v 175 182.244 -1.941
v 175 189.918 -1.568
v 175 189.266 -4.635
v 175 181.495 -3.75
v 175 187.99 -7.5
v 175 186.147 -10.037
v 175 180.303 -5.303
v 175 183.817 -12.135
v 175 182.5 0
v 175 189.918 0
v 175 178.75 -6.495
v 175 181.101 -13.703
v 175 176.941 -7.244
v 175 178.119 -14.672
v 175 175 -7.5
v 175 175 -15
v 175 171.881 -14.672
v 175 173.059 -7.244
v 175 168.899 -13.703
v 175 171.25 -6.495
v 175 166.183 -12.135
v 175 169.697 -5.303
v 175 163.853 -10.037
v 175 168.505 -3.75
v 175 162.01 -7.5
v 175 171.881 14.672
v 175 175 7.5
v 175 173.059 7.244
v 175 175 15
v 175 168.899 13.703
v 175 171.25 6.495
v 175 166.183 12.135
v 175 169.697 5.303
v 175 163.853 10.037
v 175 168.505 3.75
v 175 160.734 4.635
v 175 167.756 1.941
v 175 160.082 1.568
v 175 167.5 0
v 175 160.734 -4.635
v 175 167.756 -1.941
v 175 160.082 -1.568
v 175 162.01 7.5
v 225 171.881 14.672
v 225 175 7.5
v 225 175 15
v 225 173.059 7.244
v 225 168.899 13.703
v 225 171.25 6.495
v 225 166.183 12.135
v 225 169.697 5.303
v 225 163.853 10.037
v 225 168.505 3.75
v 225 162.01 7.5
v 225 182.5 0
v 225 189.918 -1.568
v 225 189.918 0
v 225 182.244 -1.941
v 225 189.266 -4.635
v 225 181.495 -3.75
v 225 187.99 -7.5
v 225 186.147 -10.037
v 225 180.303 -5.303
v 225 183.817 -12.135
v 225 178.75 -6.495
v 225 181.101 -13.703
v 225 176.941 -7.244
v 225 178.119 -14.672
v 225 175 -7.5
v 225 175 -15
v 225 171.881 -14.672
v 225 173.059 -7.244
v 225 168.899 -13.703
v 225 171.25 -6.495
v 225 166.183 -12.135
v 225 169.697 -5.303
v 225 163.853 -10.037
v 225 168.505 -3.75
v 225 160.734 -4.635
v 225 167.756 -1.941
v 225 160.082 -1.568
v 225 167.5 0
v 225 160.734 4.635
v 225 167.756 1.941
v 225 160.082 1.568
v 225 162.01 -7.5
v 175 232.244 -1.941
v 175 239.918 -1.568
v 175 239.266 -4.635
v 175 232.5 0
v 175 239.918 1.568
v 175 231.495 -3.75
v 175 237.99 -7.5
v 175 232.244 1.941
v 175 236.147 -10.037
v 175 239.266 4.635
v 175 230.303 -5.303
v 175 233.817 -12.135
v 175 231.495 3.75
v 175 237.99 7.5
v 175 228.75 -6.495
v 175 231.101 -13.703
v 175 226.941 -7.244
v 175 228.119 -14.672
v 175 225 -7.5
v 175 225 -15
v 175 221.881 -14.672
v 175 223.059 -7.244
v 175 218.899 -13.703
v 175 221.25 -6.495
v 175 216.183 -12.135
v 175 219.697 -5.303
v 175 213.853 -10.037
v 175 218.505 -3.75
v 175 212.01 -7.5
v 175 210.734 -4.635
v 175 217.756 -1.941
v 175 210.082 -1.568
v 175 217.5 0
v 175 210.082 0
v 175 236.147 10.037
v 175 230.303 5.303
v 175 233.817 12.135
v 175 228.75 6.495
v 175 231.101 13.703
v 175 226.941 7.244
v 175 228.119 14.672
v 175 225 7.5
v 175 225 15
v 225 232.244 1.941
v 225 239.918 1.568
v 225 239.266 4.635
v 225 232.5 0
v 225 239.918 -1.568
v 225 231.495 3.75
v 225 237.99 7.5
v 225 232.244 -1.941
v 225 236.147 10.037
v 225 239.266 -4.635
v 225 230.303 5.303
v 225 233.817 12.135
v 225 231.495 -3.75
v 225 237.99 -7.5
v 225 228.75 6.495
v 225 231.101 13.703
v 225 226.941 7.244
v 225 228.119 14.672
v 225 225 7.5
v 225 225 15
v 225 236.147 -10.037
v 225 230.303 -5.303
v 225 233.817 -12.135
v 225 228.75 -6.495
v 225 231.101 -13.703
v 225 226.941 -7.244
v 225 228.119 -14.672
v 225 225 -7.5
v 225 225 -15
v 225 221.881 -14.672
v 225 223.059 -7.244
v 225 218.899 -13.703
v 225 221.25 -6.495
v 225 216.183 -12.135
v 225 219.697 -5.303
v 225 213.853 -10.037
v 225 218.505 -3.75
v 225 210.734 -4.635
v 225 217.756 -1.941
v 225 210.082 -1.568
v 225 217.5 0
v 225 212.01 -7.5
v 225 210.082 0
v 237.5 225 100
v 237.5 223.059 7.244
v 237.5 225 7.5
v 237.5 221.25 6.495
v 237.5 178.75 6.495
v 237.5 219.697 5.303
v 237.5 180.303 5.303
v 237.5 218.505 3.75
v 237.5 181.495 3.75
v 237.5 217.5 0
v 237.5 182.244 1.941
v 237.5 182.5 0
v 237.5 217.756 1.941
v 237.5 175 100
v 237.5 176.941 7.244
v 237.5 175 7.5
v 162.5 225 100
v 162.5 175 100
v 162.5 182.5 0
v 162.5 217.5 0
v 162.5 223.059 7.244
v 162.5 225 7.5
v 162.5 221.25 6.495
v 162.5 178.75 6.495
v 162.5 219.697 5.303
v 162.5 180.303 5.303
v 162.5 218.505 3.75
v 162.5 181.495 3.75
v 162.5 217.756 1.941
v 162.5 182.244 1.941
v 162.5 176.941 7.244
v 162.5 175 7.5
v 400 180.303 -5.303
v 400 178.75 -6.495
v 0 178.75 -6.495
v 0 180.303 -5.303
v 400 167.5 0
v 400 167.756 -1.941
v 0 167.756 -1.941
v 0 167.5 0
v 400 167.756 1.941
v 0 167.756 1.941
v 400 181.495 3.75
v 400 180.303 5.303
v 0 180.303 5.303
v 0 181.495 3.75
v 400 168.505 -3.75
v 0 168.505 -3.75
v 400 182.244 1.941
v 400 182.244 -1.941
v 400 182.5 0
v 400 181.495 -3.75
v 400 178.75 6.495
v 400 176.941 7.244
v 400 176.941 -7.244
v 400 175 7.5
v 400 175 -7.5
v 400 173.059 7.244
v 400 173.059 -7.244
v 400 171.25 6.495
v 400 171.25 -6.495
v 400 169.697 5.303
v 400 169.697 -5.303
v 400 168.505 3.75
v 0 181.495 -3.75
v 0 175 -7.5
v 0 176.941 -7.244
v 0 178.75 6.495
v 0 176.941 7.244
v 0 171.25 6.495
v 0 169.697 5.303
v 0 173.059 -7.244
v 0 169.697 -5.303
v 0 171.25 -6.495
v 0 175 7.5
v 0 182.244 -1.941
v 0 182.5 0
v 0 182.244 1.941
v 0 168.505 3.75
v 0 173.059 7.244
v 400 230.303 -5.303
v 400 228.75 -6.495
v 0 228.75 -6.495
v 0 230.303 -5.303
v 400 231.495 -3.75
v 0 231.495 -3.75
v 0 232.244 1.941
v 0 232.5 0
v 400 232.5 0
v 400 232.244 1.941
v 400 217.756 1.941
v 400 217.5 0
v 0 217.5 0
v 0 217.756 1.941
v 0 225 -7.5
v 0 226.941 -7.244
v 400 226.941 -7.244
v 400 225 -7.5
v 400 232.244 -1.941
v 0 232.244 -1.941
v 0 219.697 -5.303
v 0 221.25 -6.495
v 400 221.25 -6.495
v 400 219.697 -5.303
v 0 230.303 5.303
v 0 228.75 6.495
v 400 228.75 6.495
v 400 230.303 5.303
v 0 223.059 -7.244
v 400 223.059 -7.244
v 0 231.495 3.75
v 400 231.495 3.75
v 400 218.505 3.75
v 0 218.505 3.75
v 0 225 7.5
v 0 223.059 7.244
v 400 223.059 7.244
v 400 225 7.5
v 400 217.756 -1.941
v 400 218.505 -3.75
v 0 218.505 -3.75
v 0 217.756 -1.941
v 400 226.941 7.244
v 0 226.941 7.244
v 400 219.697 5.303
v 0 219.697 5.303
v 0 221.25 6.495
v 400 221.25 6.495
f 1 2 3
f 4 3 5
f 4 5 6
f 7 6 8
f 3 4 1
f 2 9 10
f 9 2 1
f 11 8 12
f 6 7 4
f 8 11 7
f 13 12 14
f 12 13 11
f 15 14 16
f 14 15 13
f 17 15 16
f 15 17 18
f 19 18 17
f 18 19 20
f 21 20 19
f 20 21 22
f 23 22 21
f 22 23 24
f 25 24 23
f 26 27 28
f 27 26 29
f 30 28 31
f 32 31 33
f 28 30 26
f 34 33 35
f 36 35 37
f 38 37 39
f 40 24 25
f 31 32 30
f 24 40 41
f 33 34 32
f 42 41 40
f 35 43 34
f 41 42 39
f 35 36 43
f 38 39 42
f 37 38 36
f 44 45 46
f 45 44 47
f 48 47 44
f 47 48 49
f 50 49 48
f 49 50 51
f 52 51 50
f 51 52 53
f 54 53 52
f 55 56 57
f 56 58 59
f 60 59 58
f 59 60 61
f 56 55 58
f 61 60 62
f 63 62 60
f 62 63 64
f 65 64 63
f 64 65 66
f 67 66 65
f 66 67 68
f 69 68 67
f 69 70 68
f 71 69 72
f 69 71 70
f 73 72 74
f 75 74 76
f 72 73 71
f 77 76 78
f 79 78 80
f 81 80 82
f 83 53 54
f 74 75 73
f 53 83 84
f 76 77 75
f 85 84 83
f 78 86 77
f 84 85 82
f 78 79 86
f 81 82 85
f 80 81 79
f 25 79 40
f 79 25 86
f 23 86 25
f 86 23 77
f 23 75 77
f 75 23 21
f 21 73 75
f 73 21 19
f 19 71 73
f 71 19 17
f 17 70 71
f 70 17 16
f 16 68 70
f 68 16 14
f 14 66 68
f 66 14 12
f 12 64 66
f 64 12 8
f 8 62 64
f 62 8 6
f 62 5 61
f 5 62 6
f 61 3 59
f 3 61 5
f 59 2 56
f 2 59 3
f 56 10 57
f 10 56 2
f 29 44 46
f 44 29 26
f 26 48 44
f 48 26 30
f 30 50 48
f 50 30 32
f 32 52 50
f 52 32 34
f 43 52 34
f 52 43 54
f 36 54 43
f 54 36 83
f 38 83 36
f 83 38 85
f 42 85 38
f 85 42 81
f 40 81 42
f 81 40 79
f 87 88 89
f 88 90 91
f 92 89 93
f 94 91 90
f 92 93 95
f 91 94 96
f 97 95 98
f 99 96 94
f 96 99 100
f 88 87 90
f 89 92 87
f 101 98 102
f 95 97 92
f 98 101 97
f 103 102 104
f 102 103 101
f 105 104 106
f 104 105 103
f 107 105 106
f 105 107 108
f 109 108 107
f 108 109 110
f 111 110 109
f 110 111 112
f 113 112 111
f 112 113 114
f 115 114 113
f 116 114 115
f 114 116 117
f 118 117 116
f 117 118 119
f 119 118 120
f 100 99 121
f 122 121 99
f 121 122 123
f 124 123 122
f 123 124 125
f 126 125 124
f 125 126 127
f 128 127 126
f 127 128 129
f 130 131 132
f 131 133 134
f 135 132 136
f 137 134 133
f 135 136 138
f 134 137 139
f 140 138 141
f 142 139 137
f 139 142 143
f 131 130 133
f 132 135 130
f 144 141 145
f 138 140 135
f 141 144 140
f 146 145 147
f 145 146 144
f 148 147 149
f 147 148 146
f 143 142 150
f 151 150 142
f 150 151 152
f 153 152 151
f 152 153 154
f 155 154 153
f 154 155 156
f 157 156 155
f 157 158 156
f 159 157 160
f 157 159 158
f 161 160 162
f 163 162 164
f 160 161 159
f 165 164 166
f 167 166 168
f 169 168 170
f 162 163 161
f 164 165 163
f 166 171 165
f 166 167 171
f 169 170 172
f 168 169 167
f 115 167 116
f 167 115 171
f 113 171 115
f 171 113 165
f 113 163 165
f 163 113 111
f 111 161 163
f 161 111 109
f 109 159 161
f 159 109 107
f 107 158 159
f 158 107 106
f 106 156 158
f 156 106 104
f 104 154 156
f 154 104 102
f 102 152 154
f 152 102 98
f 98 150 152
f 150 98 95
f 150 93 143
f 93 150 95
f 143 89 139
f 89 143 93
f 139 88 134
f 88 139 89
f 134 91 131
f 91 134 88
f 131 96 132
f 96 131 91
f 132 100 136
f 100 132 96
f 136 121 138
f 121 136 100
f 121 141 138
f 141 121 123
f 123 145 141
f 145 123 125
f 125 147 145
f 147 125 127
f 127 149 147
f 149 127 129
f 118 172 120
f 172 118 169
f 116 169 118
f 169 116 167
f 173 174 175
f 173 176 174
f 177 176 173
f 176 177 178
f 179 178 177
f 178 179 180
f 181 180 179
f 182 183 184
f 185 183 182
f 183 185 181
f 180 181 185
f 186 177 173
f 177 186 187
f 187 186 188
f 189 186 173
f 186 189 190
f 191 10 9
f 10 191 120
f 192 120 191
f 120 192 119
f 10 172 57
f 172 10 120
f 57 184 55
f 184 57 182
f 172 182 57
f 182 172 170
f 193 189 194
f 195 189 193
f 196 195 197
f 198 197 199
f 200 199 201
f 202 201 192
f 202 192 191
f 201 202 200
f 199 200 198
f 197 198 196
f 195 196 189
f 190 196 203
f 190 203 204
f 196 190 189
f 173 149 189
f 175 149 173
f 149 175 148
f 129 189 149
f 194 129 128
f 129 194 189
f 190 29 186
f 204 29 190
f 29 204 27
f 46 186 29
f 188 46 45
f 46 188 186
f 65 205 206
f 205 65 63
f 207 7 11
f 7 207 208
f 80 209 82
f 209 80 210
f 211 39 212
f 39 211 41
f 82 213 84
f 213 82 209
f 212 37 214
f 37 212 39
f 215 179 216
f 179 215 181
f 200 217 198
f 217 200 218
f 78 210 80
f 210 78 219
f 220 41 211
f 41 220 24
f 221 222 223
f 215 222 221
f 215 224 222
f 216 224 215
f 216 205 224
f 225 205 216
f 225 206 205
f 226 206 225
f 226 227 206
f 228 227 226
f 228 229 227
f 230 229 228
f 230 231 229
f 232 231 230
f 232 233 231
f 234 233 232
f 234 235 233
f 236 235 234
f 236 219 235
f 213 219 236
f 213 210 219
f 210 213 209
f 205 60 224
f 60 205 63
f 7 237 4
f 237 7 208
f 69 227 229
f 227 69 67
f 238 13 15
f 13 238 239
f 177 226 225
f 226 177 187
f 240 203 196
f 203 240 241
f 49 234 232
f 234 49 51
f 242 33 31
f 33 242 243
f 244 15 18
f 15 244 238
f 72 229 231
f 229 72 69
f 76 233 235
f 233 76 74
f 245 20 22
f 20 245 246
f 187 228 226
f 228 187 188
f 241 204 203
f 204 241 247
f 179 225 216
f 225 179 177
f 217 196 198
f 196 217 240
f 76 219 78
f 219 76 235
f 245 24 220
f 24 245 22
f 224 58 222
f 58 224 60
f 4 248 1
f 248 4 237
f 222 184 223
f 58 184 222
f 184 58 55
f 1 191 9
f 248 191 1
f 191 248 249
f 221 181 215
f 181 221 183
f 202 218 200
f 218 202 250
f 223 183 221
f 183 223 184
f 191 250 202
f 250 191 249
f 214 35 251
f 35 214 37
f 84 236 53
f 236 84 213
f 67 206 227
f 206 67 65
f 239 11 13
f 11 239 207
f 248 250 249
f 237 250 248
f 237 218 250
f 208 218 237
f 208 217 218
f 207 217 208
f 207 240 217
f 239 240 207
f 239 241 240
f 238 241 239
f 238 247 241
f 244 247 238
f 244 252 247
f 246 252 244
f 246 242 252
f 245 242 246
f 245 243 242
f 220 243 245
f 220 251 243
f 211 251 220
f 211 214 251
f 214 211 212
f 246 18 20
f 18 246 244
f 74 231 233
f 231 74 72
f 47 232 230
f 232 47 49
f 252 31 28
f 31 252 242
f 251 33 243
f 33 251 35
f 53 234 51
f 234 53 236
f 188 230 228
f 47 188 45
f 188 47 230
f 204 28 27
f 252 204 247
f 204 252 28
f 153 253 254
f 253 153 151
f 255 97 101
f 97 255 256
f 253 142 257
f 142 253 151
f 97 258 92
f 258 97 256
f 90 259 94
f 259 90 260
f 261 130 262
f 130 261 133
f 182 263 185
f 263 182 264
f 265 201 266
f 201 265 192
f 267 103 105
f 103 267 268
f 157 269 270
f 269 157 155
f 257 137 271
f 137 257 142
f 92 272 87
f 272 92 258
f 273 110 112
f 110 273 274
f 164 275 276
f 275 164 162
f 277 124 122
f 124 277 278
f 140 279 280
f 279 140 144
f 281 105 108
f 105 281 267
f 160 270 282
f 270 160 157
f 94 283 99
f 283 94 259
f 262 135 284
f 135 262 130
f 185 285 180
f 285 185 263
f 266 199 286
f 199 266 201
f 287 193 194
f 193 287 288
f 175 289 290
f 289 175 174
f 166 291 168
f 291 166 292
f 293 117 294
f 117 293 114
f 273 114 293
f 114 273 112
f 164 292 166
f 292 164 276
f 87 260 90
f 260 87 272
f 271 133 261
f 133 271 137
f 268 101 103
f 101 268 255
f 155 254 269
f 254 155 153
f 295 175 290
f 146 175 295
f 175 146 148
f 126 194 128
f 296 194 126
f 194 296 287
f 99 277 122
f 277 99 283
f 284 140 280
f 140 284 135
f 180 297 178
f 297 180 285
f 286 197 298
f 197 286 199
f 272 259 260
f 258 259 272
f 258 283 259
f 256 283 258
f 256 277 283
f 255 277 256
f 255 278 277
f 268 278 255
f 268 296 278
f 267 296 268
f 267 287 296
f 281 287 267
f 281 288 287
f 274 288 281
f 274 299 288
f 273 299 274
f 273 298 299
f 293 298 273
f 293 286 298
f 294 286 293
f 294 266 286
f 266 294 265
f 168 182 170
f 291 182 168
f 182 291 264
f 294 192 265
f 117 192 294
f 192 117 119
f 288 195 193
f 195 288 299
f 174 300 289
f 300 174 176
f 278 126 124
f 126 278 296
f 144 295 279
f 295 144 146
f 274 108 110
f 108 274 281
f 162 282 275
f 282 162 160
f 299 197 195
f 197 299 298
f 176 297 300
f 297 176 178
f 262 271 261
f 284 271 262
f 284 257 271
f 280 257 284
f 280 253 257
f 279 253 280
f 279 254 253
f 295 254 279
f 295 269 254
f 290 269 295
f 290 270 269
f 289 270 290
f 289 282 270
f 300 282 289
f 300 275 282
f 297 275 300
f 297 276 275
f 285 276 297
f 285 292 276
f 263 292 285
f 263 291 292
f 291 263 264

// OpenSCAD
tool_volume=[75, 50, 100];
tool_offset=[-tool_volume[0]/2, -tool_volume[1]/2, 0];

working_volume=[400, 400, 600];

bed_thickness=5;


//_p=[0,0,0];

// Tool Volume

//$t=0;

theta=360*$t;

_an_cx = working_volume[0]/2;
_an_cy = working_volume[1]/2;

_an_r = 100 * sin(3*theta);

_p = [_an_cx + _an_r * cos(theta), _an_cy + _an_r * sin(theta), 0];



translate([0,_p[1], 0]) {

    // X Axis
    
    rail_spacing=50;
    rail_diameter=15;
    
    translate([0,-rail_spacing/2,0]) {
        rotate([0,90,0]) {
            cylinder(d=rail_diameter, h=working_volume[0]);
        }
    }
    translate([0, rail_spacing/2,0]) {
        rotate([0,90,0]) {
            cylinder(d=rail_diameter, h=working_volume[0]);
        }
    }
    
    
    
    // Carriage
    translate([_p[0], 0, 0]) {
        
        bearing_length=50;
        
        translate([0,-rail_spacing/2,0]) {
            bearing(rail_diameter, 30, bearing_length);
        }
        translate([0,rail_spacing/2,0]) {
            bearing(rail_diameter, 30, bearing_length);
        }
        
        
        translate(tool_offset) {
            #cube(tool_volume);
        }
    }
}

    module bearing(id, od, l) {
        translate([-l/2,0,0]) {
                rotate([0,90,0]){
                    linear_extrude(height=l) {
                        difference() {
                            circle(d=od);
                            circle(d=id);
                        }
                    }
                }
            }
        }

// Work Volume
//%cube(working_volume);

// Bed
module bed() {
translate([0,0,working_volume[2]-_p[2]]) {
    translate([0,0,-bed_thickness]) {
        cube([working_volume[0], working_volume[1], bed_thickness]);
    }
}
}
